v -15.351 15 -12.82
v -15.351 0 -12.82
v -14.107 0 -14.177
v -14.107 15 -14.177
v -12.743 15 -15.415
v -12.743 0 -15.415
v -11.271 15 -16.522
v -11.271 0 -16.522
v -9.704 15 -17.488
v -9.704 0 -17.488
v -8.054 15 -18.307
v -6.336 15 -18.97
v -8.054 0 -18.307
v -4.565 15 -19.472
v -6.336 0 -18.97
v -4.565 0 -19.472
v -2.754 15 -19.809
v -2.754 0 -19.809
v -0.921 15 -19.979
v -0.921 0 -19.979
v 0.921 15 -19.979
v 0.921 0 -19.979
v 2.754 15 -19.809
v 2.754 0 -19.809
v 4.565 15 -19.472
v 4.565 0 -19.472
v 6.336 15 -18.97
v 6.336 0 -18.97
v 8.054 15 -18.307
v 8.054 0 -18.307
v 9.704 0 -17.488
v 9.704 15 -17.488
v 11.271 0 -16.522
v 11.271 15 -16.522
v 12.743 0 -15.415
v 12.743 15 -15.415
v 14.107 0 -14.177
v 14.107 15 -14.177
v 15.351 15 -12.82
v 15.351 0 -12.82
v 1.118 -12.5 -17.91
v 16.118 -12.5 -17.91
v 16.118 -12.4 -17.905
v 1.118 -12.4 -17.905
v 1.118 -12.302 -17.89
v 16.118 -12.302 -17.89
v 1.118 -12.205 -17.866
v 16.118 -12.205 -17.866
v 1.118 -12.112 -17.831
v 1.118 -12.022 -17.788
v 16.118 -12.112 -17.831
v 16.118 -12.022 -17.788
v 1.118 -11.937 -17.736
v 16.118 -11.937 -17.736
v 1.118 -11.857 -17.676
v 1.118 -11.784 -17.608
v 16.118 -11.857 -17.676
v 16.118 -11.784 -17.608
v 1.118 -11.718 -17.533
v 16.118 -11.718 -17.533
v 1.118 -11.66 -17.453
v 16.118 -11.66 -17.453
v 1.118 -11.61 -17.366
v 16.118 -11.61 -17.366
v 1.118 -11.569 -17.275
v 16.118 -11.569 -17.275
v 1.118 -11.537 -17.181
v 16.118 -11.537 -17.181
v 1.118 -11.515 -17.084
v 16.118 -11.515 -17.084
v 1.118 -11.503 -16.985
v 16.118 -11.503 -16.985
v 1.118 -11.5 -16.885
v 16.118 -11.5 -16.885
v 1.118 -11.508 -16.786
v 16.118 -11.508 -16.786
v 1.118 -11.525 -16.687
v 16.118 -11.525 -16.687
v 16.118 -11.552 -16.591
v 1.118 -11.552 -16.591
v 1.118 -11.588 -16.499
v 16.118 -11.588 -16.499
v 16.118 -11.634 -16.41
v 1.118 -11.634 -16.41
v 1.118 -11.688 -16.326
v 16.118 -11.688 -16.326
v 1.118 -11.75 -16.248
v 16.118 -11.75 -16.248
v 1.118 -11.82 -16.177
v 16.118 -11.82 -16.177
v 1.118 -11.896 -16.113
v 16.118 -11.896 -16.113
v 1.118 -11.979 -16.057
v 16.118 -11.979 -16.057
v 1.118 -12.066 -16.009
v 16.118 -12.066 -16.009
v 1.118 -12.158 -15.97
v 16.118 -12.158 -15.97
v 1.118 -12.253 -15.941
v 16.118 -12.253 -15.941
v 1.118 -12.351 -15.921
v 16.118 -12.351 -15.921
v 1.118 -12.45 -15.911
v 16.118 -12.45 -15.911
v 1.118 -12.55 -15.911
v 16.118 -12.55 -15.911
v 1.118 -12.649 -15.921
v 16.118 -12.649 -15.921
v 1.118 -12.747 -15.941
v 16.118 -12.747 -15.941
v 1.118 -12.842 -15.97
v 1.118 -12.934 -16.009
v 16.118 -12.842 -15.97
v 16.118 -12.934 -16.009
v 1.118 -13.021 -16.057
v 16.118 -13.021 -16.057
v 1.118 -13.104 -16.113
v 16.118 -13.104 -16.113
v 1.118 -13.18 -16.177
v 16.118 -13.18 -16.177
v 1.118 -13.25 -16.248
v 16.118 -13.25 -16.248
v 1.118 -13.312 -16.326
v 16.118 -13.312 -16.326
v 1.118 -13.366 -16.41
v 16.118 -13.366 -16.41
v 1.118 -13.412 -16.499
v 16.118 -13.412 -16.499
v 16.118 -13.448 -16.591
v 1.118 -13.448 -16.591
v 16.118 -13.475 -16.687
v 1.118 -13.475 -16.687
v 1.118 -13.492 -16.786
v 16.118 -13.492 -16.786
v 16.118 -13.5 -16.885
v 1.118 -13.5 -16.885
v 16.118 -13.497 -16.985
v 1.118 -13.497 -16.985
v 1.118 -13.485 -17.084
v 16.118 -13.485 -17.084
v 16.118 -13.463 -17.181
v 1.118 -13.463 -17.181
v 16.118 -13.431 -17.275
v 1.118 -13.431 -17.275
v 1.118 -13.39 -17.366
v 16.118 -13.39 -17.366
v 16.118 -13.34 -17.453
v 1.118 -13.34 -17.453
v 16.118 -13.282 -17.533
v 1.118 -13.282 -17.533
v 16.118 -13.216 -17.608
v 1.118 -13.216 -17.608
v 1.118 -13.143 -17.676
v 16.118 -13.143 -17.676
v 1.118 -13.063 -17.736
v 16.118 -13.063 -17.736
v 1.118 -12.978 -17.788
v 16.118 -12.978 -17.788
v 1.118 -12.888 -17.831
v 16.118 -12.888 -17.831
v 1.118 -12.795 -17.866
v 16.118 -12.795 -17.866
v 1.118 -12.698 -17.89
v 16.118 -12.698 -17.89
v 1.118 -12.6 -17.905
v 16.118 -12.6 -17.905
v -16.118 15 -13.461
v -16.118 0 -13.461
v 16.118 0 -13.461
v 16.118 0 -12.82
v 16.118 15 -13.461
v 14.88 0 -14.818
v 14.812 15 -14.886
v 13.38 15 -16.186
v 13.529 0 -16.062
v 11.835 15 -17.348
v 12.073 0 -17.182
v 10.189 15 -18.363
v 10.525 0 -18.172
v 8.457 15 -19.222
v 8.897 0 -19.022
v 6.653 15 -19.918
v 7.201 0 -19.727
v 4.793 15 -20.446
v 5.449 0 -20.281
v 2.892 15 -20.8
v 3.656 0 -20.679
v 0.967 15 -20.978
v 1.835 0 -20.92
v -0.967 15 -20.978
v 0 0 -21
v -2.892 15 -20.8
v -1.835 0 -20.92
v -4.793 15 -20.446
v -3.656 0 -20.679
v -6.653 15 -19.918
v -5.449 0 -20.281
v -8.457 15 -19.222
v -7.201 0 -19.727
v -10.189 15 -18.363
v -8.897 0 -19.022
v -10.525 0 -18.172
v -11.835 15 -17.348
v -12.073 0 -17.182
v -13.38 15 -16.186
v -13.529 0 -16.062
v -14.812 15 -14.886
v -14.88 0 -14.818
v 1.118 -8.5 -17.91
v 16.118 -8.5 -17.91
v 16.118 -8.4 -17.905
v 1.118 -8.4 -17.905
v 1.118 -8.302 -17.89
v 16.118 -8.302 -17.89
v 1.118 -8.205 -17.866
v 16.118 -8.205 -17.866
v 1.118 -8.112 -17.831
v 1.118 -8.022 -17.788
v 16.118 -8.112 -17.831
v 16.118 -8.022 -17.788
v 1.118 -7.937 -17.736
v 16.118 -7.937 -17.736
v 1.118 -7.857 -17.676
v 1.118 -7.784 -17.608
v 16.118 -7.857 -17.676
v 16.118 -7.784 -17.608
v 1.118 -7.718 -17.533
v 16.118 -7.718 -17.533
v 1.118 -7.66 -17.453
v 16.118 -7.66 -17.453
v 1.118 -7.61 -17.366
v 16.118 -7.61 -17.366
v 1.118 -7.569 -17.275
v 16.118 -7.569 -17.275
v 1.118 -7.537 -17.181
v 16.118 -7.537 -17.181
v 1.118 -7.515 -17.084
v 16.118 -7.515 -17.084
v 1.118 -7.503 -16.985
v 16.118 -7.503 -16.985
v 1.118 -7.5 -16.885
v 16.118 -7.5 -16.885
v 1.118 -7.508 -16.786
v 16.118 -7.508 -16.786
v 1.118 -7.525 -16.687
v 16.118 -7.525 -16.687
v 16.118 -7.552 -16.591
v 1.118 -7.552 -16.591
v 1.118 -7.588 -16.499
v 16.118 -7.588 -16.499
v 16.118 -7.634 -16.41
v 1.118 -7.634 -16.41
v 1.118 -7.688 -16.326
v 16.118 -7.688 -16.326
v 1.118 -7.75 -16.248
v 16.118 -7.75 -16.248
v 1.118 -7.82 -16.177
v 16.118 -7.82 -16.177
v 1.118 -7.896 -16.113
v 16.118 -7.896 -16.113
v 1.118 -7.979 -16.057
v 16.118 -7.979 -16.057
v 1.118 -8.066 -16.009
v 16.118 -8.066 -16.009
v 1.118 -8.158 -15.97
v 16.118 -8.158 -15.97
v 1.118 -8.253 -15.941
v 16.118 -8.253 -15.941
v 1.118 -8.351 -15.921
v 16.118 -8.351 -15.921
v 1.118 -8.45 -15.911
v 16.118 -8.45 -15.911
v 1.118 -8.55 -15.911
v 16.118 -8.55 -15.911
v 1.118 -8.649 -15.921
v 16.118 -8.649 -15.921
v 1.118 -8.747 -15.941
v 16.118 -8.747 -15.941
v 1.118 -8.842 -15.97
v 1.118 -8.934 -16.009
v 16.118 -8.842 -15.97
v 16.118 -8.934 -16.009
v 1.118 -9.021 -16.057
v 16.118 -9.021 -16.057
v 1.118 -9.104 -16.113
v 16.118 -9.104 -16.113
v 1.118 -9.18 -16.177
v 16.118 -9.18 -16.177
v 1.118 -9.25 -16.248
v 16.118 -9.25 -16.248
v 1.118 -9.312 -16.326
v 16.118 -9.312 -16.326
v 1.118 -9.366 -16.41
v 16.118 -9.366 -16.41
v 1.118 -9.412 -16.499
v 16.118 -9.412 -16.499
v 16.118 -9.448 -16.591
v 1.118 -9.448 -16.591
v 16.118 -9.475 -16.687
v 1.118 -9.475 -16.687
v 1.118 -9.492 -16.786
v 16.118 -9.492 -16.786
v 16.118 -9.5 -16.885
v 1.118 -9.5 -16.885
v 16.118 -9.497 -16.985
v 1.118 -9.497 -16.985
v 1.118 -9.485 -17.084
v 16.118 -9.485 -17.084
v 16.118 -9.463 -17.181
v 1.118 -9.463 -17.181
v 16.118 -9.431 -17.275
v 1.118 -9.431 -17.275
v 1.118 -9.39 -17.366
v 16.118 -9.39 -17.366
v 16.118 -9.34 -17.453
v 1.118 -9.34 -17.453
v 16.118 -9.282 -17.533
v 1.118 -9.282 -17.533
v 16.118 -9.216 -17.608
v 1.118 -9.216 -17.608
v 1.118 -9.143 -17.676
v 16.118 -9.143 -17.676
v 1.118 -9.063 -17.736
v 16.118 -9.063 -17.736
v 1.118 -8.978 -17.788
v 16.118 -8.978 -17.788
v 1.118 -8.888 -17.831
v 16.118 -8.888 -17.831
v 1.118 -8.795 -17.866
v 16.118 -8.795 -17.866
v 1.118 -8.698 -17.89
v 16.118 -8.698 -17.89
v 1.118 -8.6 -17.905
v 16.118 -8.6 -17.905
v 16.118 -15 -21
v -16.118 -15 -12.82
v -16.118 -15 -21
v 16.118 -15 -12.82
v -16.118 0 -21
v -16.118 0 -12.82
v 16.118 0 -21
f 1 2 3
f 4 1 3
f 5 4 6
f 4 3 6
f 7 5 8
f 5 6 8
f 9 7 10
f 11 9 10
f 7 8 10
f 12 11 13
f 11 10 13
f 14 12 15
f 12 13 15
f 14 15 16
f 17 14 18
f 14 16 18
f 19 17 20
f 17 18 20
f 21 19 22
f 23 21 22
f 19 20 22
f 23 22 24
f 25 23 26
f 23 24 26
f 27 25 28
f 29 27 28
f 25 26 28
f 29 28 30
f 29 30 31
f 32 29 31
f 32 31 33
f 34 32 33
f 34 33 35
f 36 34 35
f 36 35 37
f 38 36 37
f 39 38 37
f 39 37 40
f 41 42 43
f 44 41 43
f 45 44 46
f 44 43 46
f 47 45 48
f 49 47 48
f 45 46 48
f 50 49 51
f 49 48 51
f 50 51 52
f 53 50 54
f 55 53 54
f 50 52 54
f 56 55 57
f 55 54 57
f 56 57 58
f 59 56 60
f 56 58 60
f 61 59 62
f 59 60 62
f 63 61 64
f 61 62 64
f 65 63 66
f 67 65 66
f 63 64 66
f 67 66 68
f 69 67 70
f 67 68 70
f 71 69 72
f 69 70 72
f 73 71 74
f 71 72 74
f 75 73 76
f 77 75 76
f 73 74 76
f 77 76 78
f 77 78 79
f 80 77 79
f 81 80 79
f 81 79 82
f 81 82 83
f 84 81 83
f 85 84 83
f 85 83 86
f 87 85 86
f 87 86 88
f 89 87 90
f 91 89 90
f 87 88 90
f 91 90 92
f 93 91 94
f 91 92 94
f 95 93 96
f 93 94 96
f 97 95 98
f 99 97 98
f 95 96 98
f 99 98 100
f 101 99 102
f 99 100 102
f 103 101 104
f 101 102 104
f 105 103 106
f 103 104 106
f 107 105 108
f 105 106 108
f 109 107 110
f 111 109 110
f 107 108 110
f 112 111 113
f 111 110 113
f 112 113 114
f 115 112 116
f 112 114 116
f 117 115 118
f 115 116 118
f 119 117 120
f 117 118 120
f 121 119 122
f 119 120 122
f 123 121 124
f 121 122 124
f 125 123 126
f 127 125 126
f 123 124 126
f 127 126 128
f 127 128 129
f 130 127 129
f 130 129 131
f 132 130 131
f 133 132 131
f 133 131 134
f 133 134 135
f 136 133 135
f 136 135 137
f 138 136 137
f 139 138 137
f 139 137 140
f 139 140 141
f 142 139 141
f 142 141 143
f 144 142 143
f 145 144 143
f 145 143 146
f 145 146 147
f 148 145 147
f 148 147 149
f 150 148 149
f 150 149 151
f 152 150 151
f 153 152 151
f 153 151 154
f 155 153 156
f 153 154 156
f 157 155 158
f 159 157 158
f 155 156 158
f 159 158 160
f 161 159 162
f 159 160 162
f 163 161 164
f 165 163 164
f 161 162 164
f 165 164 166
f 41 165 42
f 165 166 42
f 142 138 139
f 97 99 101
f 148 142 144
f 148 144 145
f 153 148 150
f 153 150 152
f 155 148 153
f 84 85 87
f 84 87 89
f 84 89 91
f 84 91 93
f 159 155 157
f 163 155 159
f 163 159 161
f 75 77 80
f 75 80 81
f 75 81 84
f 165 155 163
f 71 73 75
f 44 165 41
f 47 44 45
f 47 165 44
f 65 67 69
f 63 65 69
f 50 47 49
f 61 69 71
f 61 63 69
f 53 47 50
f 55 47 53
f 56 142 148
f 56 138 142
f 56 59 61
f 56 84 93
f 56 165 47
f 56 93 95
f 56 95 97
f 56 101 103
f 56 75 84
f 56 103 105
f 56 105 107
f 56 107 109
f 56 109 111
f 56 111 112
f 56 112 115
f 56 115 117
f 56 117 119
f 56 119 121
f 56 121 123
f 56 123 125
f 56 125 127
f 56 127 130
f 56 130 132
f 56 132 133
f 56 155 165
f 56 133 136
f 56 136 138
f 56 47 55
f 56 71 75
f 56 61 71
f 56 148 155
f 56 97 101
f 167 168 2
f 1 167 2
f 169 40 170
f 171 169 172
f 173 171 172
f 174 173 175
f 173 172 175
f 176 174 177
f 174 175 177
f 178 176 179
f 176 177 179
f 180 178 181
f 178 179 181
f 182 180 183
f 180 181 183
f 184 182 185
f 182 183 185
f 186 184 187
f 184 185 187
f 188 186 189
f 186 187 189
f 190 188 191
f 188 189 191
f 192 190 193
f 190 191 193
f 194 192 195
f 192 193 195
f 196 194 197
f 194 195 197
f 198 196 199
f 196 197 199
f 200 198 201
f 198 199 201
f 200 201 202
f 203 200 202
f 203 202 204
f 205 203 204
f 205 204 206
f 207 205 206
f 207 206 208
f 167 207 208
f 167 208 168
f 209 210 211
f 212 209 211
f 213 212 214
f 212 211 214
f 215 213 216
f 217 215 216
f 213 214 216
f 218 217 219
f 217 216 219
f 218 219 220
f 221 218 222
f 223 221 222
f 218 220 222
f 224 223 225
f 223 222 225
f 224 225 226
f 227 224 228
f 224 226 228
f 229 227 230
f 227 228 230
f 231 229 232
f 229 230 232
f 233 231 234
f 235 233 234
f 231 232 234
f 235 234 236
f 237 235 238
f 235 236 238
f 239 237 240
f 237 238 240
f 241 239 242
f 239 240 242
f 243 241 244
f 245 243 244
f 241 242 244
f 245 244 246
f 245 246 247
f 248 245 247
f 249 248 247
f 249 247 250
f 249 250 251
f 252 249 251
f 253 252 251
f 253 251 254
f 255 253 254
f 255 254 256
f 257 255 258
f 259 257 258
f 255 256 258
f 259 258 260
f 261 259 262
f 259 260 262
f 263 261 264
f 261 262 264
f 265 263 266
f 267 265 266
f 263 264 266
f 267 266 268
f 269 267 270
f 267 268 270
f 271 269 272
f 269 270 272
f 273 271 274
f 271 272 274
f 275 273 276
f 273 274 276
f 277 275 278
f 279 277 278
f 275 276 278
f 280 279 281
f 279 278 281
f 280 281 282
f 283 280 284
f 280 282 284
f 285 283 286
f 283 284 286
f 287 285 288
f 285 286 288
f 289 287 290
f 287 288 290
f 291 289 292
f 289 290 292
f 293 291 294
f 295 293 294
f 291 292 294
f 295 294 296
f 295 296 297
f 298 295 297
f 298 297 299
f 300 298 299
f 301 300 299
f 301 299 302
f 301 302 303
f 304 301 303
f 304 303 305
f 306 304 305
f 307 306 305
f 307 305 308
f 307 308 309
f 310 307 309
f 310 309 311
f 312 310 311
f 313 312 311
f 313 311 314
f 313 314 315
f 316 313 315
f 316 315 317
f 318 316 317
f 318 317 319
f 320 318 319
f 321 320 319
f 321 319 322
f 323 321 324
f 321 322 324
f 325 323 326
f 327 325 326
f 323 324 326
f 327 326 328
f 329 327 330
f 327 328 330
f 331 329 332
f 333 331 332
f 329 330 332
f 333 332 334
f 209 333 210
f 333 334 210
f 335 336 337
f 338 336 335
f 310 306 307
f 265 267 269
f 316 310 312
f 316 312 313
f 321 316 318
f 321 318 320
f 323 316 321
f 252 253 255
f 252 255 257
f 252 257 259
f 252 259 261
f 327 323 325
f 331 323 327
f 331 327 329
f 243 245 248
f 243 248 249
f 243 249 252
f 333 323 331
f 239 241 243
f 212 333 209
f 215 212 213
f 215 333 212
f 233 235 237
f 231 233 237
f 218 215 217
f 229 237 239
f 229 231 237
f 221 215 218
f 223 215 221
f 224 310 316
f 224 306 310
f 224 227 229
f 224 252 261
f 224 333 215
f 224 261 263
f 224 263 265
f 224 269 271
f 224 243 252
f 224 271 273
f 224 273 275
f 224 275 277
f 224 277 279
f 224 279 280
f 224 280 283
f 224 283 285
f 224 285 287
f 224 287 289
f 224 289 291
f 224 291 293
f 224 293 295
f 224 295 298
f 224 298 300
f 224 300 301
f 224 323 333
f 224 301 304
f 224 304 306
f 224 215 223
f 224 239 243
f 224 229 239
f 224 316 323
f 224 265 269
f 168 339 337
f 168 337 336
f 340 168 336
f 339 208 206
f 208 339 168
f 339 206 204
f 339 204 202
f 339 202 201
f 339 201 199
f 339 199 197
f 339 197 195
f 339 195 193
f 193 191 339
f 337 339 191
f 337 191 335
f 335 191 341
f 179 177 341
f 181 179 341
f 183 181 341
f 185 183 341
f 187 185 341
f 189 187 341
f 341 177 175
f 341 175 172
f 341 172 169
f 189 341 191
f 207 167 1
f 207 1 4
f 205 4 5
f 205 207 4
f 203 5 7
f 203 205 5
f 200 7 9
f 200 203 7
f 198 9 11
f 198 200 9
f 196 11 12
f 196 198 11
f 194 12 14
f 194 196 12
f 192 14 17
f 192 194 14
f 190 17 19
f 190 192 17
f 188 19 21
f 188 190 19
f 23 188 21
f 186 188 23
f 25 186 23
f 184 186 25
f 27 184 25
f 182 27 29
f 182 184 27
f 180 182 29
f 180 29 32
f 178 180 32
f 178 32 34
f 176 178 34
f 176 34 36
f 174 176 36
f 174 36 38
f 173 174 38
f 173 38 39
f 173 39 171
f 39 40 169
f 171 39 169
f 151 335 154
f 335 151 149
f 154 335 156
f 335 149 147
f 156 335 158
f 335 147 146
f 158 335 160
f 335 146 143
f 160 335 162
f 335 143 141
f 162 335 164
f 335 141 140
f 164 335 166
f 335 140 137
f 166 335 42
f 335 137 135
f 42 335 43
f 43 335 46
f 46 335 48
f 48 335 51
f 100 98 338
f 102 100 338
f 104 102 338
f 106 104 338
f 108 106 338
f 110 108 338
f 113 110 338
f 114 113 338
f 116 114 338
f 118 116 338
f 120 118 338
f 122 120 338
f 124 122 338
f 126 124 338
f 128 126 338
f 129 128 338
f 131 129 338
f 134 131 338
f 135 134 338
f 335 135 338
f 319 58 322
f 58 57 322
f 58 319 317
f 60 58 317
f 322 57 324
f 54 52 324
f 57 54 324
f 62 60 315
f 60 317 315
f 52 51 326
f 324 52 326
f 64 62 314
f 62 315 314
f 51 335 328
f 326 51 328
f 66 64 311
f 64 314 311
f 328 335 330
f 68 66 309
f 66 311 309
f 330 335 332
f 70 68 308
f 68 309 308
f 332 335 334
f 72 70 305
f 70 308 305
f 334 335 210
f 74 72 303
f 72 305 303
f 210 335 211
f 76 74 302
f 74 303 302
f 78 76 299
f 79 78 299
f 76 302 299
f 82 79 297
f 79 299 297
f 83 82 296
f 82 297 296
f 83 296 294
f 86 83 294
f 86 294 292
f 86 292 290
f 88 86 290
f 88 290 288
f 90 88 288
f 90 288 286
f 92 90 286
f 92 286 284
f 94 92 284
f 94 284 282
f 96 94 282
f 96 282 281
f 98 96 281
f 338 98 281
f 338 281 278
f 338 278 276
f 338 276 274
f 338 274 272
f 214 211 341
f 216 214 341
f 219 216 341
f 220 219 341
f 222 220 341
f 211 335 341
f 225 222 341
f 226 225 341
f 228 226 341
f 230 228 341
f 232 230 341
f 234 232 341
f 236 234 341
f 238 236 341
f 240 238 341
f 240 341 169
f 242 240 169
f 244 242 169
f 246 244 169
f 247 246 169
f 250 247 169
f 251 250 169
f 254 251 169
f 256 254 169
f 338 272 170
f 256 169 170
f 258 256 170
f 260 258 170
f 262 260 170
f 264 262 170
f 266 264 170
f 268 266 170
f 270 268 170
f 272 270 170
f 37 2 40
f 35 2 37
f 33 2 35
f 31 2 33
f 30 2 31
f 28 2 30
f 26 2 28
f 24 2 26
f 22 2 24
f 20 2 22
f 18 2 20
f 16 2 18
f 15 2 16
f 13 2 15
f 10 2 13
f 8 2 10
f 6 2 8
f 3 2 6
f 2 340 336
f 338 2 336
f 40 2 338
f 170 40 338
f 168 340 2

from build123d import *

# Parameters (mm, degrees)
BOSS_EXTRUDE1_DEPTH = 15
SKETCH3_W           = 32.23682377
SKETCH3_H           = 8.180060941
BOSS_EXTRUDE2_DEPTH = 15
SKETCH4_R           = 1
CUT_EXTRUDE1_DEPTH  = 15


with BuildPart() as part:
    # Sketch2 → Boss-Extrude1 (new body)
    with BuildSketch(Plane(origin=(0, 0, 0), x_dir=(1, 0, 0), z_dir=(0, 1, 0))):
        with BuildLine():
            Line((-16.118411885, 13.460936011), (-15.350868462, 12.819939059))
            ThreePointArc((-15.350868462, 12.819939059), (0, 20), (15.350868462, 12.819939059))
            Line((15.350868462, 12.819939059), (16.118411885, 13.460936011))
            ThreePointArc((16.118411885, 13.460936011), (0, 21), (-16.118411885, 13.460936011))
        make_face()
    extrude(amount=BOSS_EXTRUDE1_DEPTH)

    # Sketch3 → Boss-Extrude2 (add)
    with BuildSketch(Plane.XZ):
        with Locations((0, -16.909969529)):
            Rectangle(SKETCH3_W, SKETCH3_H)
    extrude(amount=BOSS_EXTRUDE2_DEPTH)

    # Sketch4 → Cut-Extrude1 (cut)
    with BuildSketch(Plane(origin=(16.118411885, 0, 0), x_dir=(0, 0, -1), z_dir=(1, 0, 0))):
        with Locations((16.909969529, -12.5)):
            Circle(SKETCH4_R)
        with Locations((16.909969529, -8.5)):
            Circle(SKETCH4_R)
    extrude(amount=-CUT_EXTRUDE1_DEPTH, mode=Mode.SUBTRACT)


solid = part.part
